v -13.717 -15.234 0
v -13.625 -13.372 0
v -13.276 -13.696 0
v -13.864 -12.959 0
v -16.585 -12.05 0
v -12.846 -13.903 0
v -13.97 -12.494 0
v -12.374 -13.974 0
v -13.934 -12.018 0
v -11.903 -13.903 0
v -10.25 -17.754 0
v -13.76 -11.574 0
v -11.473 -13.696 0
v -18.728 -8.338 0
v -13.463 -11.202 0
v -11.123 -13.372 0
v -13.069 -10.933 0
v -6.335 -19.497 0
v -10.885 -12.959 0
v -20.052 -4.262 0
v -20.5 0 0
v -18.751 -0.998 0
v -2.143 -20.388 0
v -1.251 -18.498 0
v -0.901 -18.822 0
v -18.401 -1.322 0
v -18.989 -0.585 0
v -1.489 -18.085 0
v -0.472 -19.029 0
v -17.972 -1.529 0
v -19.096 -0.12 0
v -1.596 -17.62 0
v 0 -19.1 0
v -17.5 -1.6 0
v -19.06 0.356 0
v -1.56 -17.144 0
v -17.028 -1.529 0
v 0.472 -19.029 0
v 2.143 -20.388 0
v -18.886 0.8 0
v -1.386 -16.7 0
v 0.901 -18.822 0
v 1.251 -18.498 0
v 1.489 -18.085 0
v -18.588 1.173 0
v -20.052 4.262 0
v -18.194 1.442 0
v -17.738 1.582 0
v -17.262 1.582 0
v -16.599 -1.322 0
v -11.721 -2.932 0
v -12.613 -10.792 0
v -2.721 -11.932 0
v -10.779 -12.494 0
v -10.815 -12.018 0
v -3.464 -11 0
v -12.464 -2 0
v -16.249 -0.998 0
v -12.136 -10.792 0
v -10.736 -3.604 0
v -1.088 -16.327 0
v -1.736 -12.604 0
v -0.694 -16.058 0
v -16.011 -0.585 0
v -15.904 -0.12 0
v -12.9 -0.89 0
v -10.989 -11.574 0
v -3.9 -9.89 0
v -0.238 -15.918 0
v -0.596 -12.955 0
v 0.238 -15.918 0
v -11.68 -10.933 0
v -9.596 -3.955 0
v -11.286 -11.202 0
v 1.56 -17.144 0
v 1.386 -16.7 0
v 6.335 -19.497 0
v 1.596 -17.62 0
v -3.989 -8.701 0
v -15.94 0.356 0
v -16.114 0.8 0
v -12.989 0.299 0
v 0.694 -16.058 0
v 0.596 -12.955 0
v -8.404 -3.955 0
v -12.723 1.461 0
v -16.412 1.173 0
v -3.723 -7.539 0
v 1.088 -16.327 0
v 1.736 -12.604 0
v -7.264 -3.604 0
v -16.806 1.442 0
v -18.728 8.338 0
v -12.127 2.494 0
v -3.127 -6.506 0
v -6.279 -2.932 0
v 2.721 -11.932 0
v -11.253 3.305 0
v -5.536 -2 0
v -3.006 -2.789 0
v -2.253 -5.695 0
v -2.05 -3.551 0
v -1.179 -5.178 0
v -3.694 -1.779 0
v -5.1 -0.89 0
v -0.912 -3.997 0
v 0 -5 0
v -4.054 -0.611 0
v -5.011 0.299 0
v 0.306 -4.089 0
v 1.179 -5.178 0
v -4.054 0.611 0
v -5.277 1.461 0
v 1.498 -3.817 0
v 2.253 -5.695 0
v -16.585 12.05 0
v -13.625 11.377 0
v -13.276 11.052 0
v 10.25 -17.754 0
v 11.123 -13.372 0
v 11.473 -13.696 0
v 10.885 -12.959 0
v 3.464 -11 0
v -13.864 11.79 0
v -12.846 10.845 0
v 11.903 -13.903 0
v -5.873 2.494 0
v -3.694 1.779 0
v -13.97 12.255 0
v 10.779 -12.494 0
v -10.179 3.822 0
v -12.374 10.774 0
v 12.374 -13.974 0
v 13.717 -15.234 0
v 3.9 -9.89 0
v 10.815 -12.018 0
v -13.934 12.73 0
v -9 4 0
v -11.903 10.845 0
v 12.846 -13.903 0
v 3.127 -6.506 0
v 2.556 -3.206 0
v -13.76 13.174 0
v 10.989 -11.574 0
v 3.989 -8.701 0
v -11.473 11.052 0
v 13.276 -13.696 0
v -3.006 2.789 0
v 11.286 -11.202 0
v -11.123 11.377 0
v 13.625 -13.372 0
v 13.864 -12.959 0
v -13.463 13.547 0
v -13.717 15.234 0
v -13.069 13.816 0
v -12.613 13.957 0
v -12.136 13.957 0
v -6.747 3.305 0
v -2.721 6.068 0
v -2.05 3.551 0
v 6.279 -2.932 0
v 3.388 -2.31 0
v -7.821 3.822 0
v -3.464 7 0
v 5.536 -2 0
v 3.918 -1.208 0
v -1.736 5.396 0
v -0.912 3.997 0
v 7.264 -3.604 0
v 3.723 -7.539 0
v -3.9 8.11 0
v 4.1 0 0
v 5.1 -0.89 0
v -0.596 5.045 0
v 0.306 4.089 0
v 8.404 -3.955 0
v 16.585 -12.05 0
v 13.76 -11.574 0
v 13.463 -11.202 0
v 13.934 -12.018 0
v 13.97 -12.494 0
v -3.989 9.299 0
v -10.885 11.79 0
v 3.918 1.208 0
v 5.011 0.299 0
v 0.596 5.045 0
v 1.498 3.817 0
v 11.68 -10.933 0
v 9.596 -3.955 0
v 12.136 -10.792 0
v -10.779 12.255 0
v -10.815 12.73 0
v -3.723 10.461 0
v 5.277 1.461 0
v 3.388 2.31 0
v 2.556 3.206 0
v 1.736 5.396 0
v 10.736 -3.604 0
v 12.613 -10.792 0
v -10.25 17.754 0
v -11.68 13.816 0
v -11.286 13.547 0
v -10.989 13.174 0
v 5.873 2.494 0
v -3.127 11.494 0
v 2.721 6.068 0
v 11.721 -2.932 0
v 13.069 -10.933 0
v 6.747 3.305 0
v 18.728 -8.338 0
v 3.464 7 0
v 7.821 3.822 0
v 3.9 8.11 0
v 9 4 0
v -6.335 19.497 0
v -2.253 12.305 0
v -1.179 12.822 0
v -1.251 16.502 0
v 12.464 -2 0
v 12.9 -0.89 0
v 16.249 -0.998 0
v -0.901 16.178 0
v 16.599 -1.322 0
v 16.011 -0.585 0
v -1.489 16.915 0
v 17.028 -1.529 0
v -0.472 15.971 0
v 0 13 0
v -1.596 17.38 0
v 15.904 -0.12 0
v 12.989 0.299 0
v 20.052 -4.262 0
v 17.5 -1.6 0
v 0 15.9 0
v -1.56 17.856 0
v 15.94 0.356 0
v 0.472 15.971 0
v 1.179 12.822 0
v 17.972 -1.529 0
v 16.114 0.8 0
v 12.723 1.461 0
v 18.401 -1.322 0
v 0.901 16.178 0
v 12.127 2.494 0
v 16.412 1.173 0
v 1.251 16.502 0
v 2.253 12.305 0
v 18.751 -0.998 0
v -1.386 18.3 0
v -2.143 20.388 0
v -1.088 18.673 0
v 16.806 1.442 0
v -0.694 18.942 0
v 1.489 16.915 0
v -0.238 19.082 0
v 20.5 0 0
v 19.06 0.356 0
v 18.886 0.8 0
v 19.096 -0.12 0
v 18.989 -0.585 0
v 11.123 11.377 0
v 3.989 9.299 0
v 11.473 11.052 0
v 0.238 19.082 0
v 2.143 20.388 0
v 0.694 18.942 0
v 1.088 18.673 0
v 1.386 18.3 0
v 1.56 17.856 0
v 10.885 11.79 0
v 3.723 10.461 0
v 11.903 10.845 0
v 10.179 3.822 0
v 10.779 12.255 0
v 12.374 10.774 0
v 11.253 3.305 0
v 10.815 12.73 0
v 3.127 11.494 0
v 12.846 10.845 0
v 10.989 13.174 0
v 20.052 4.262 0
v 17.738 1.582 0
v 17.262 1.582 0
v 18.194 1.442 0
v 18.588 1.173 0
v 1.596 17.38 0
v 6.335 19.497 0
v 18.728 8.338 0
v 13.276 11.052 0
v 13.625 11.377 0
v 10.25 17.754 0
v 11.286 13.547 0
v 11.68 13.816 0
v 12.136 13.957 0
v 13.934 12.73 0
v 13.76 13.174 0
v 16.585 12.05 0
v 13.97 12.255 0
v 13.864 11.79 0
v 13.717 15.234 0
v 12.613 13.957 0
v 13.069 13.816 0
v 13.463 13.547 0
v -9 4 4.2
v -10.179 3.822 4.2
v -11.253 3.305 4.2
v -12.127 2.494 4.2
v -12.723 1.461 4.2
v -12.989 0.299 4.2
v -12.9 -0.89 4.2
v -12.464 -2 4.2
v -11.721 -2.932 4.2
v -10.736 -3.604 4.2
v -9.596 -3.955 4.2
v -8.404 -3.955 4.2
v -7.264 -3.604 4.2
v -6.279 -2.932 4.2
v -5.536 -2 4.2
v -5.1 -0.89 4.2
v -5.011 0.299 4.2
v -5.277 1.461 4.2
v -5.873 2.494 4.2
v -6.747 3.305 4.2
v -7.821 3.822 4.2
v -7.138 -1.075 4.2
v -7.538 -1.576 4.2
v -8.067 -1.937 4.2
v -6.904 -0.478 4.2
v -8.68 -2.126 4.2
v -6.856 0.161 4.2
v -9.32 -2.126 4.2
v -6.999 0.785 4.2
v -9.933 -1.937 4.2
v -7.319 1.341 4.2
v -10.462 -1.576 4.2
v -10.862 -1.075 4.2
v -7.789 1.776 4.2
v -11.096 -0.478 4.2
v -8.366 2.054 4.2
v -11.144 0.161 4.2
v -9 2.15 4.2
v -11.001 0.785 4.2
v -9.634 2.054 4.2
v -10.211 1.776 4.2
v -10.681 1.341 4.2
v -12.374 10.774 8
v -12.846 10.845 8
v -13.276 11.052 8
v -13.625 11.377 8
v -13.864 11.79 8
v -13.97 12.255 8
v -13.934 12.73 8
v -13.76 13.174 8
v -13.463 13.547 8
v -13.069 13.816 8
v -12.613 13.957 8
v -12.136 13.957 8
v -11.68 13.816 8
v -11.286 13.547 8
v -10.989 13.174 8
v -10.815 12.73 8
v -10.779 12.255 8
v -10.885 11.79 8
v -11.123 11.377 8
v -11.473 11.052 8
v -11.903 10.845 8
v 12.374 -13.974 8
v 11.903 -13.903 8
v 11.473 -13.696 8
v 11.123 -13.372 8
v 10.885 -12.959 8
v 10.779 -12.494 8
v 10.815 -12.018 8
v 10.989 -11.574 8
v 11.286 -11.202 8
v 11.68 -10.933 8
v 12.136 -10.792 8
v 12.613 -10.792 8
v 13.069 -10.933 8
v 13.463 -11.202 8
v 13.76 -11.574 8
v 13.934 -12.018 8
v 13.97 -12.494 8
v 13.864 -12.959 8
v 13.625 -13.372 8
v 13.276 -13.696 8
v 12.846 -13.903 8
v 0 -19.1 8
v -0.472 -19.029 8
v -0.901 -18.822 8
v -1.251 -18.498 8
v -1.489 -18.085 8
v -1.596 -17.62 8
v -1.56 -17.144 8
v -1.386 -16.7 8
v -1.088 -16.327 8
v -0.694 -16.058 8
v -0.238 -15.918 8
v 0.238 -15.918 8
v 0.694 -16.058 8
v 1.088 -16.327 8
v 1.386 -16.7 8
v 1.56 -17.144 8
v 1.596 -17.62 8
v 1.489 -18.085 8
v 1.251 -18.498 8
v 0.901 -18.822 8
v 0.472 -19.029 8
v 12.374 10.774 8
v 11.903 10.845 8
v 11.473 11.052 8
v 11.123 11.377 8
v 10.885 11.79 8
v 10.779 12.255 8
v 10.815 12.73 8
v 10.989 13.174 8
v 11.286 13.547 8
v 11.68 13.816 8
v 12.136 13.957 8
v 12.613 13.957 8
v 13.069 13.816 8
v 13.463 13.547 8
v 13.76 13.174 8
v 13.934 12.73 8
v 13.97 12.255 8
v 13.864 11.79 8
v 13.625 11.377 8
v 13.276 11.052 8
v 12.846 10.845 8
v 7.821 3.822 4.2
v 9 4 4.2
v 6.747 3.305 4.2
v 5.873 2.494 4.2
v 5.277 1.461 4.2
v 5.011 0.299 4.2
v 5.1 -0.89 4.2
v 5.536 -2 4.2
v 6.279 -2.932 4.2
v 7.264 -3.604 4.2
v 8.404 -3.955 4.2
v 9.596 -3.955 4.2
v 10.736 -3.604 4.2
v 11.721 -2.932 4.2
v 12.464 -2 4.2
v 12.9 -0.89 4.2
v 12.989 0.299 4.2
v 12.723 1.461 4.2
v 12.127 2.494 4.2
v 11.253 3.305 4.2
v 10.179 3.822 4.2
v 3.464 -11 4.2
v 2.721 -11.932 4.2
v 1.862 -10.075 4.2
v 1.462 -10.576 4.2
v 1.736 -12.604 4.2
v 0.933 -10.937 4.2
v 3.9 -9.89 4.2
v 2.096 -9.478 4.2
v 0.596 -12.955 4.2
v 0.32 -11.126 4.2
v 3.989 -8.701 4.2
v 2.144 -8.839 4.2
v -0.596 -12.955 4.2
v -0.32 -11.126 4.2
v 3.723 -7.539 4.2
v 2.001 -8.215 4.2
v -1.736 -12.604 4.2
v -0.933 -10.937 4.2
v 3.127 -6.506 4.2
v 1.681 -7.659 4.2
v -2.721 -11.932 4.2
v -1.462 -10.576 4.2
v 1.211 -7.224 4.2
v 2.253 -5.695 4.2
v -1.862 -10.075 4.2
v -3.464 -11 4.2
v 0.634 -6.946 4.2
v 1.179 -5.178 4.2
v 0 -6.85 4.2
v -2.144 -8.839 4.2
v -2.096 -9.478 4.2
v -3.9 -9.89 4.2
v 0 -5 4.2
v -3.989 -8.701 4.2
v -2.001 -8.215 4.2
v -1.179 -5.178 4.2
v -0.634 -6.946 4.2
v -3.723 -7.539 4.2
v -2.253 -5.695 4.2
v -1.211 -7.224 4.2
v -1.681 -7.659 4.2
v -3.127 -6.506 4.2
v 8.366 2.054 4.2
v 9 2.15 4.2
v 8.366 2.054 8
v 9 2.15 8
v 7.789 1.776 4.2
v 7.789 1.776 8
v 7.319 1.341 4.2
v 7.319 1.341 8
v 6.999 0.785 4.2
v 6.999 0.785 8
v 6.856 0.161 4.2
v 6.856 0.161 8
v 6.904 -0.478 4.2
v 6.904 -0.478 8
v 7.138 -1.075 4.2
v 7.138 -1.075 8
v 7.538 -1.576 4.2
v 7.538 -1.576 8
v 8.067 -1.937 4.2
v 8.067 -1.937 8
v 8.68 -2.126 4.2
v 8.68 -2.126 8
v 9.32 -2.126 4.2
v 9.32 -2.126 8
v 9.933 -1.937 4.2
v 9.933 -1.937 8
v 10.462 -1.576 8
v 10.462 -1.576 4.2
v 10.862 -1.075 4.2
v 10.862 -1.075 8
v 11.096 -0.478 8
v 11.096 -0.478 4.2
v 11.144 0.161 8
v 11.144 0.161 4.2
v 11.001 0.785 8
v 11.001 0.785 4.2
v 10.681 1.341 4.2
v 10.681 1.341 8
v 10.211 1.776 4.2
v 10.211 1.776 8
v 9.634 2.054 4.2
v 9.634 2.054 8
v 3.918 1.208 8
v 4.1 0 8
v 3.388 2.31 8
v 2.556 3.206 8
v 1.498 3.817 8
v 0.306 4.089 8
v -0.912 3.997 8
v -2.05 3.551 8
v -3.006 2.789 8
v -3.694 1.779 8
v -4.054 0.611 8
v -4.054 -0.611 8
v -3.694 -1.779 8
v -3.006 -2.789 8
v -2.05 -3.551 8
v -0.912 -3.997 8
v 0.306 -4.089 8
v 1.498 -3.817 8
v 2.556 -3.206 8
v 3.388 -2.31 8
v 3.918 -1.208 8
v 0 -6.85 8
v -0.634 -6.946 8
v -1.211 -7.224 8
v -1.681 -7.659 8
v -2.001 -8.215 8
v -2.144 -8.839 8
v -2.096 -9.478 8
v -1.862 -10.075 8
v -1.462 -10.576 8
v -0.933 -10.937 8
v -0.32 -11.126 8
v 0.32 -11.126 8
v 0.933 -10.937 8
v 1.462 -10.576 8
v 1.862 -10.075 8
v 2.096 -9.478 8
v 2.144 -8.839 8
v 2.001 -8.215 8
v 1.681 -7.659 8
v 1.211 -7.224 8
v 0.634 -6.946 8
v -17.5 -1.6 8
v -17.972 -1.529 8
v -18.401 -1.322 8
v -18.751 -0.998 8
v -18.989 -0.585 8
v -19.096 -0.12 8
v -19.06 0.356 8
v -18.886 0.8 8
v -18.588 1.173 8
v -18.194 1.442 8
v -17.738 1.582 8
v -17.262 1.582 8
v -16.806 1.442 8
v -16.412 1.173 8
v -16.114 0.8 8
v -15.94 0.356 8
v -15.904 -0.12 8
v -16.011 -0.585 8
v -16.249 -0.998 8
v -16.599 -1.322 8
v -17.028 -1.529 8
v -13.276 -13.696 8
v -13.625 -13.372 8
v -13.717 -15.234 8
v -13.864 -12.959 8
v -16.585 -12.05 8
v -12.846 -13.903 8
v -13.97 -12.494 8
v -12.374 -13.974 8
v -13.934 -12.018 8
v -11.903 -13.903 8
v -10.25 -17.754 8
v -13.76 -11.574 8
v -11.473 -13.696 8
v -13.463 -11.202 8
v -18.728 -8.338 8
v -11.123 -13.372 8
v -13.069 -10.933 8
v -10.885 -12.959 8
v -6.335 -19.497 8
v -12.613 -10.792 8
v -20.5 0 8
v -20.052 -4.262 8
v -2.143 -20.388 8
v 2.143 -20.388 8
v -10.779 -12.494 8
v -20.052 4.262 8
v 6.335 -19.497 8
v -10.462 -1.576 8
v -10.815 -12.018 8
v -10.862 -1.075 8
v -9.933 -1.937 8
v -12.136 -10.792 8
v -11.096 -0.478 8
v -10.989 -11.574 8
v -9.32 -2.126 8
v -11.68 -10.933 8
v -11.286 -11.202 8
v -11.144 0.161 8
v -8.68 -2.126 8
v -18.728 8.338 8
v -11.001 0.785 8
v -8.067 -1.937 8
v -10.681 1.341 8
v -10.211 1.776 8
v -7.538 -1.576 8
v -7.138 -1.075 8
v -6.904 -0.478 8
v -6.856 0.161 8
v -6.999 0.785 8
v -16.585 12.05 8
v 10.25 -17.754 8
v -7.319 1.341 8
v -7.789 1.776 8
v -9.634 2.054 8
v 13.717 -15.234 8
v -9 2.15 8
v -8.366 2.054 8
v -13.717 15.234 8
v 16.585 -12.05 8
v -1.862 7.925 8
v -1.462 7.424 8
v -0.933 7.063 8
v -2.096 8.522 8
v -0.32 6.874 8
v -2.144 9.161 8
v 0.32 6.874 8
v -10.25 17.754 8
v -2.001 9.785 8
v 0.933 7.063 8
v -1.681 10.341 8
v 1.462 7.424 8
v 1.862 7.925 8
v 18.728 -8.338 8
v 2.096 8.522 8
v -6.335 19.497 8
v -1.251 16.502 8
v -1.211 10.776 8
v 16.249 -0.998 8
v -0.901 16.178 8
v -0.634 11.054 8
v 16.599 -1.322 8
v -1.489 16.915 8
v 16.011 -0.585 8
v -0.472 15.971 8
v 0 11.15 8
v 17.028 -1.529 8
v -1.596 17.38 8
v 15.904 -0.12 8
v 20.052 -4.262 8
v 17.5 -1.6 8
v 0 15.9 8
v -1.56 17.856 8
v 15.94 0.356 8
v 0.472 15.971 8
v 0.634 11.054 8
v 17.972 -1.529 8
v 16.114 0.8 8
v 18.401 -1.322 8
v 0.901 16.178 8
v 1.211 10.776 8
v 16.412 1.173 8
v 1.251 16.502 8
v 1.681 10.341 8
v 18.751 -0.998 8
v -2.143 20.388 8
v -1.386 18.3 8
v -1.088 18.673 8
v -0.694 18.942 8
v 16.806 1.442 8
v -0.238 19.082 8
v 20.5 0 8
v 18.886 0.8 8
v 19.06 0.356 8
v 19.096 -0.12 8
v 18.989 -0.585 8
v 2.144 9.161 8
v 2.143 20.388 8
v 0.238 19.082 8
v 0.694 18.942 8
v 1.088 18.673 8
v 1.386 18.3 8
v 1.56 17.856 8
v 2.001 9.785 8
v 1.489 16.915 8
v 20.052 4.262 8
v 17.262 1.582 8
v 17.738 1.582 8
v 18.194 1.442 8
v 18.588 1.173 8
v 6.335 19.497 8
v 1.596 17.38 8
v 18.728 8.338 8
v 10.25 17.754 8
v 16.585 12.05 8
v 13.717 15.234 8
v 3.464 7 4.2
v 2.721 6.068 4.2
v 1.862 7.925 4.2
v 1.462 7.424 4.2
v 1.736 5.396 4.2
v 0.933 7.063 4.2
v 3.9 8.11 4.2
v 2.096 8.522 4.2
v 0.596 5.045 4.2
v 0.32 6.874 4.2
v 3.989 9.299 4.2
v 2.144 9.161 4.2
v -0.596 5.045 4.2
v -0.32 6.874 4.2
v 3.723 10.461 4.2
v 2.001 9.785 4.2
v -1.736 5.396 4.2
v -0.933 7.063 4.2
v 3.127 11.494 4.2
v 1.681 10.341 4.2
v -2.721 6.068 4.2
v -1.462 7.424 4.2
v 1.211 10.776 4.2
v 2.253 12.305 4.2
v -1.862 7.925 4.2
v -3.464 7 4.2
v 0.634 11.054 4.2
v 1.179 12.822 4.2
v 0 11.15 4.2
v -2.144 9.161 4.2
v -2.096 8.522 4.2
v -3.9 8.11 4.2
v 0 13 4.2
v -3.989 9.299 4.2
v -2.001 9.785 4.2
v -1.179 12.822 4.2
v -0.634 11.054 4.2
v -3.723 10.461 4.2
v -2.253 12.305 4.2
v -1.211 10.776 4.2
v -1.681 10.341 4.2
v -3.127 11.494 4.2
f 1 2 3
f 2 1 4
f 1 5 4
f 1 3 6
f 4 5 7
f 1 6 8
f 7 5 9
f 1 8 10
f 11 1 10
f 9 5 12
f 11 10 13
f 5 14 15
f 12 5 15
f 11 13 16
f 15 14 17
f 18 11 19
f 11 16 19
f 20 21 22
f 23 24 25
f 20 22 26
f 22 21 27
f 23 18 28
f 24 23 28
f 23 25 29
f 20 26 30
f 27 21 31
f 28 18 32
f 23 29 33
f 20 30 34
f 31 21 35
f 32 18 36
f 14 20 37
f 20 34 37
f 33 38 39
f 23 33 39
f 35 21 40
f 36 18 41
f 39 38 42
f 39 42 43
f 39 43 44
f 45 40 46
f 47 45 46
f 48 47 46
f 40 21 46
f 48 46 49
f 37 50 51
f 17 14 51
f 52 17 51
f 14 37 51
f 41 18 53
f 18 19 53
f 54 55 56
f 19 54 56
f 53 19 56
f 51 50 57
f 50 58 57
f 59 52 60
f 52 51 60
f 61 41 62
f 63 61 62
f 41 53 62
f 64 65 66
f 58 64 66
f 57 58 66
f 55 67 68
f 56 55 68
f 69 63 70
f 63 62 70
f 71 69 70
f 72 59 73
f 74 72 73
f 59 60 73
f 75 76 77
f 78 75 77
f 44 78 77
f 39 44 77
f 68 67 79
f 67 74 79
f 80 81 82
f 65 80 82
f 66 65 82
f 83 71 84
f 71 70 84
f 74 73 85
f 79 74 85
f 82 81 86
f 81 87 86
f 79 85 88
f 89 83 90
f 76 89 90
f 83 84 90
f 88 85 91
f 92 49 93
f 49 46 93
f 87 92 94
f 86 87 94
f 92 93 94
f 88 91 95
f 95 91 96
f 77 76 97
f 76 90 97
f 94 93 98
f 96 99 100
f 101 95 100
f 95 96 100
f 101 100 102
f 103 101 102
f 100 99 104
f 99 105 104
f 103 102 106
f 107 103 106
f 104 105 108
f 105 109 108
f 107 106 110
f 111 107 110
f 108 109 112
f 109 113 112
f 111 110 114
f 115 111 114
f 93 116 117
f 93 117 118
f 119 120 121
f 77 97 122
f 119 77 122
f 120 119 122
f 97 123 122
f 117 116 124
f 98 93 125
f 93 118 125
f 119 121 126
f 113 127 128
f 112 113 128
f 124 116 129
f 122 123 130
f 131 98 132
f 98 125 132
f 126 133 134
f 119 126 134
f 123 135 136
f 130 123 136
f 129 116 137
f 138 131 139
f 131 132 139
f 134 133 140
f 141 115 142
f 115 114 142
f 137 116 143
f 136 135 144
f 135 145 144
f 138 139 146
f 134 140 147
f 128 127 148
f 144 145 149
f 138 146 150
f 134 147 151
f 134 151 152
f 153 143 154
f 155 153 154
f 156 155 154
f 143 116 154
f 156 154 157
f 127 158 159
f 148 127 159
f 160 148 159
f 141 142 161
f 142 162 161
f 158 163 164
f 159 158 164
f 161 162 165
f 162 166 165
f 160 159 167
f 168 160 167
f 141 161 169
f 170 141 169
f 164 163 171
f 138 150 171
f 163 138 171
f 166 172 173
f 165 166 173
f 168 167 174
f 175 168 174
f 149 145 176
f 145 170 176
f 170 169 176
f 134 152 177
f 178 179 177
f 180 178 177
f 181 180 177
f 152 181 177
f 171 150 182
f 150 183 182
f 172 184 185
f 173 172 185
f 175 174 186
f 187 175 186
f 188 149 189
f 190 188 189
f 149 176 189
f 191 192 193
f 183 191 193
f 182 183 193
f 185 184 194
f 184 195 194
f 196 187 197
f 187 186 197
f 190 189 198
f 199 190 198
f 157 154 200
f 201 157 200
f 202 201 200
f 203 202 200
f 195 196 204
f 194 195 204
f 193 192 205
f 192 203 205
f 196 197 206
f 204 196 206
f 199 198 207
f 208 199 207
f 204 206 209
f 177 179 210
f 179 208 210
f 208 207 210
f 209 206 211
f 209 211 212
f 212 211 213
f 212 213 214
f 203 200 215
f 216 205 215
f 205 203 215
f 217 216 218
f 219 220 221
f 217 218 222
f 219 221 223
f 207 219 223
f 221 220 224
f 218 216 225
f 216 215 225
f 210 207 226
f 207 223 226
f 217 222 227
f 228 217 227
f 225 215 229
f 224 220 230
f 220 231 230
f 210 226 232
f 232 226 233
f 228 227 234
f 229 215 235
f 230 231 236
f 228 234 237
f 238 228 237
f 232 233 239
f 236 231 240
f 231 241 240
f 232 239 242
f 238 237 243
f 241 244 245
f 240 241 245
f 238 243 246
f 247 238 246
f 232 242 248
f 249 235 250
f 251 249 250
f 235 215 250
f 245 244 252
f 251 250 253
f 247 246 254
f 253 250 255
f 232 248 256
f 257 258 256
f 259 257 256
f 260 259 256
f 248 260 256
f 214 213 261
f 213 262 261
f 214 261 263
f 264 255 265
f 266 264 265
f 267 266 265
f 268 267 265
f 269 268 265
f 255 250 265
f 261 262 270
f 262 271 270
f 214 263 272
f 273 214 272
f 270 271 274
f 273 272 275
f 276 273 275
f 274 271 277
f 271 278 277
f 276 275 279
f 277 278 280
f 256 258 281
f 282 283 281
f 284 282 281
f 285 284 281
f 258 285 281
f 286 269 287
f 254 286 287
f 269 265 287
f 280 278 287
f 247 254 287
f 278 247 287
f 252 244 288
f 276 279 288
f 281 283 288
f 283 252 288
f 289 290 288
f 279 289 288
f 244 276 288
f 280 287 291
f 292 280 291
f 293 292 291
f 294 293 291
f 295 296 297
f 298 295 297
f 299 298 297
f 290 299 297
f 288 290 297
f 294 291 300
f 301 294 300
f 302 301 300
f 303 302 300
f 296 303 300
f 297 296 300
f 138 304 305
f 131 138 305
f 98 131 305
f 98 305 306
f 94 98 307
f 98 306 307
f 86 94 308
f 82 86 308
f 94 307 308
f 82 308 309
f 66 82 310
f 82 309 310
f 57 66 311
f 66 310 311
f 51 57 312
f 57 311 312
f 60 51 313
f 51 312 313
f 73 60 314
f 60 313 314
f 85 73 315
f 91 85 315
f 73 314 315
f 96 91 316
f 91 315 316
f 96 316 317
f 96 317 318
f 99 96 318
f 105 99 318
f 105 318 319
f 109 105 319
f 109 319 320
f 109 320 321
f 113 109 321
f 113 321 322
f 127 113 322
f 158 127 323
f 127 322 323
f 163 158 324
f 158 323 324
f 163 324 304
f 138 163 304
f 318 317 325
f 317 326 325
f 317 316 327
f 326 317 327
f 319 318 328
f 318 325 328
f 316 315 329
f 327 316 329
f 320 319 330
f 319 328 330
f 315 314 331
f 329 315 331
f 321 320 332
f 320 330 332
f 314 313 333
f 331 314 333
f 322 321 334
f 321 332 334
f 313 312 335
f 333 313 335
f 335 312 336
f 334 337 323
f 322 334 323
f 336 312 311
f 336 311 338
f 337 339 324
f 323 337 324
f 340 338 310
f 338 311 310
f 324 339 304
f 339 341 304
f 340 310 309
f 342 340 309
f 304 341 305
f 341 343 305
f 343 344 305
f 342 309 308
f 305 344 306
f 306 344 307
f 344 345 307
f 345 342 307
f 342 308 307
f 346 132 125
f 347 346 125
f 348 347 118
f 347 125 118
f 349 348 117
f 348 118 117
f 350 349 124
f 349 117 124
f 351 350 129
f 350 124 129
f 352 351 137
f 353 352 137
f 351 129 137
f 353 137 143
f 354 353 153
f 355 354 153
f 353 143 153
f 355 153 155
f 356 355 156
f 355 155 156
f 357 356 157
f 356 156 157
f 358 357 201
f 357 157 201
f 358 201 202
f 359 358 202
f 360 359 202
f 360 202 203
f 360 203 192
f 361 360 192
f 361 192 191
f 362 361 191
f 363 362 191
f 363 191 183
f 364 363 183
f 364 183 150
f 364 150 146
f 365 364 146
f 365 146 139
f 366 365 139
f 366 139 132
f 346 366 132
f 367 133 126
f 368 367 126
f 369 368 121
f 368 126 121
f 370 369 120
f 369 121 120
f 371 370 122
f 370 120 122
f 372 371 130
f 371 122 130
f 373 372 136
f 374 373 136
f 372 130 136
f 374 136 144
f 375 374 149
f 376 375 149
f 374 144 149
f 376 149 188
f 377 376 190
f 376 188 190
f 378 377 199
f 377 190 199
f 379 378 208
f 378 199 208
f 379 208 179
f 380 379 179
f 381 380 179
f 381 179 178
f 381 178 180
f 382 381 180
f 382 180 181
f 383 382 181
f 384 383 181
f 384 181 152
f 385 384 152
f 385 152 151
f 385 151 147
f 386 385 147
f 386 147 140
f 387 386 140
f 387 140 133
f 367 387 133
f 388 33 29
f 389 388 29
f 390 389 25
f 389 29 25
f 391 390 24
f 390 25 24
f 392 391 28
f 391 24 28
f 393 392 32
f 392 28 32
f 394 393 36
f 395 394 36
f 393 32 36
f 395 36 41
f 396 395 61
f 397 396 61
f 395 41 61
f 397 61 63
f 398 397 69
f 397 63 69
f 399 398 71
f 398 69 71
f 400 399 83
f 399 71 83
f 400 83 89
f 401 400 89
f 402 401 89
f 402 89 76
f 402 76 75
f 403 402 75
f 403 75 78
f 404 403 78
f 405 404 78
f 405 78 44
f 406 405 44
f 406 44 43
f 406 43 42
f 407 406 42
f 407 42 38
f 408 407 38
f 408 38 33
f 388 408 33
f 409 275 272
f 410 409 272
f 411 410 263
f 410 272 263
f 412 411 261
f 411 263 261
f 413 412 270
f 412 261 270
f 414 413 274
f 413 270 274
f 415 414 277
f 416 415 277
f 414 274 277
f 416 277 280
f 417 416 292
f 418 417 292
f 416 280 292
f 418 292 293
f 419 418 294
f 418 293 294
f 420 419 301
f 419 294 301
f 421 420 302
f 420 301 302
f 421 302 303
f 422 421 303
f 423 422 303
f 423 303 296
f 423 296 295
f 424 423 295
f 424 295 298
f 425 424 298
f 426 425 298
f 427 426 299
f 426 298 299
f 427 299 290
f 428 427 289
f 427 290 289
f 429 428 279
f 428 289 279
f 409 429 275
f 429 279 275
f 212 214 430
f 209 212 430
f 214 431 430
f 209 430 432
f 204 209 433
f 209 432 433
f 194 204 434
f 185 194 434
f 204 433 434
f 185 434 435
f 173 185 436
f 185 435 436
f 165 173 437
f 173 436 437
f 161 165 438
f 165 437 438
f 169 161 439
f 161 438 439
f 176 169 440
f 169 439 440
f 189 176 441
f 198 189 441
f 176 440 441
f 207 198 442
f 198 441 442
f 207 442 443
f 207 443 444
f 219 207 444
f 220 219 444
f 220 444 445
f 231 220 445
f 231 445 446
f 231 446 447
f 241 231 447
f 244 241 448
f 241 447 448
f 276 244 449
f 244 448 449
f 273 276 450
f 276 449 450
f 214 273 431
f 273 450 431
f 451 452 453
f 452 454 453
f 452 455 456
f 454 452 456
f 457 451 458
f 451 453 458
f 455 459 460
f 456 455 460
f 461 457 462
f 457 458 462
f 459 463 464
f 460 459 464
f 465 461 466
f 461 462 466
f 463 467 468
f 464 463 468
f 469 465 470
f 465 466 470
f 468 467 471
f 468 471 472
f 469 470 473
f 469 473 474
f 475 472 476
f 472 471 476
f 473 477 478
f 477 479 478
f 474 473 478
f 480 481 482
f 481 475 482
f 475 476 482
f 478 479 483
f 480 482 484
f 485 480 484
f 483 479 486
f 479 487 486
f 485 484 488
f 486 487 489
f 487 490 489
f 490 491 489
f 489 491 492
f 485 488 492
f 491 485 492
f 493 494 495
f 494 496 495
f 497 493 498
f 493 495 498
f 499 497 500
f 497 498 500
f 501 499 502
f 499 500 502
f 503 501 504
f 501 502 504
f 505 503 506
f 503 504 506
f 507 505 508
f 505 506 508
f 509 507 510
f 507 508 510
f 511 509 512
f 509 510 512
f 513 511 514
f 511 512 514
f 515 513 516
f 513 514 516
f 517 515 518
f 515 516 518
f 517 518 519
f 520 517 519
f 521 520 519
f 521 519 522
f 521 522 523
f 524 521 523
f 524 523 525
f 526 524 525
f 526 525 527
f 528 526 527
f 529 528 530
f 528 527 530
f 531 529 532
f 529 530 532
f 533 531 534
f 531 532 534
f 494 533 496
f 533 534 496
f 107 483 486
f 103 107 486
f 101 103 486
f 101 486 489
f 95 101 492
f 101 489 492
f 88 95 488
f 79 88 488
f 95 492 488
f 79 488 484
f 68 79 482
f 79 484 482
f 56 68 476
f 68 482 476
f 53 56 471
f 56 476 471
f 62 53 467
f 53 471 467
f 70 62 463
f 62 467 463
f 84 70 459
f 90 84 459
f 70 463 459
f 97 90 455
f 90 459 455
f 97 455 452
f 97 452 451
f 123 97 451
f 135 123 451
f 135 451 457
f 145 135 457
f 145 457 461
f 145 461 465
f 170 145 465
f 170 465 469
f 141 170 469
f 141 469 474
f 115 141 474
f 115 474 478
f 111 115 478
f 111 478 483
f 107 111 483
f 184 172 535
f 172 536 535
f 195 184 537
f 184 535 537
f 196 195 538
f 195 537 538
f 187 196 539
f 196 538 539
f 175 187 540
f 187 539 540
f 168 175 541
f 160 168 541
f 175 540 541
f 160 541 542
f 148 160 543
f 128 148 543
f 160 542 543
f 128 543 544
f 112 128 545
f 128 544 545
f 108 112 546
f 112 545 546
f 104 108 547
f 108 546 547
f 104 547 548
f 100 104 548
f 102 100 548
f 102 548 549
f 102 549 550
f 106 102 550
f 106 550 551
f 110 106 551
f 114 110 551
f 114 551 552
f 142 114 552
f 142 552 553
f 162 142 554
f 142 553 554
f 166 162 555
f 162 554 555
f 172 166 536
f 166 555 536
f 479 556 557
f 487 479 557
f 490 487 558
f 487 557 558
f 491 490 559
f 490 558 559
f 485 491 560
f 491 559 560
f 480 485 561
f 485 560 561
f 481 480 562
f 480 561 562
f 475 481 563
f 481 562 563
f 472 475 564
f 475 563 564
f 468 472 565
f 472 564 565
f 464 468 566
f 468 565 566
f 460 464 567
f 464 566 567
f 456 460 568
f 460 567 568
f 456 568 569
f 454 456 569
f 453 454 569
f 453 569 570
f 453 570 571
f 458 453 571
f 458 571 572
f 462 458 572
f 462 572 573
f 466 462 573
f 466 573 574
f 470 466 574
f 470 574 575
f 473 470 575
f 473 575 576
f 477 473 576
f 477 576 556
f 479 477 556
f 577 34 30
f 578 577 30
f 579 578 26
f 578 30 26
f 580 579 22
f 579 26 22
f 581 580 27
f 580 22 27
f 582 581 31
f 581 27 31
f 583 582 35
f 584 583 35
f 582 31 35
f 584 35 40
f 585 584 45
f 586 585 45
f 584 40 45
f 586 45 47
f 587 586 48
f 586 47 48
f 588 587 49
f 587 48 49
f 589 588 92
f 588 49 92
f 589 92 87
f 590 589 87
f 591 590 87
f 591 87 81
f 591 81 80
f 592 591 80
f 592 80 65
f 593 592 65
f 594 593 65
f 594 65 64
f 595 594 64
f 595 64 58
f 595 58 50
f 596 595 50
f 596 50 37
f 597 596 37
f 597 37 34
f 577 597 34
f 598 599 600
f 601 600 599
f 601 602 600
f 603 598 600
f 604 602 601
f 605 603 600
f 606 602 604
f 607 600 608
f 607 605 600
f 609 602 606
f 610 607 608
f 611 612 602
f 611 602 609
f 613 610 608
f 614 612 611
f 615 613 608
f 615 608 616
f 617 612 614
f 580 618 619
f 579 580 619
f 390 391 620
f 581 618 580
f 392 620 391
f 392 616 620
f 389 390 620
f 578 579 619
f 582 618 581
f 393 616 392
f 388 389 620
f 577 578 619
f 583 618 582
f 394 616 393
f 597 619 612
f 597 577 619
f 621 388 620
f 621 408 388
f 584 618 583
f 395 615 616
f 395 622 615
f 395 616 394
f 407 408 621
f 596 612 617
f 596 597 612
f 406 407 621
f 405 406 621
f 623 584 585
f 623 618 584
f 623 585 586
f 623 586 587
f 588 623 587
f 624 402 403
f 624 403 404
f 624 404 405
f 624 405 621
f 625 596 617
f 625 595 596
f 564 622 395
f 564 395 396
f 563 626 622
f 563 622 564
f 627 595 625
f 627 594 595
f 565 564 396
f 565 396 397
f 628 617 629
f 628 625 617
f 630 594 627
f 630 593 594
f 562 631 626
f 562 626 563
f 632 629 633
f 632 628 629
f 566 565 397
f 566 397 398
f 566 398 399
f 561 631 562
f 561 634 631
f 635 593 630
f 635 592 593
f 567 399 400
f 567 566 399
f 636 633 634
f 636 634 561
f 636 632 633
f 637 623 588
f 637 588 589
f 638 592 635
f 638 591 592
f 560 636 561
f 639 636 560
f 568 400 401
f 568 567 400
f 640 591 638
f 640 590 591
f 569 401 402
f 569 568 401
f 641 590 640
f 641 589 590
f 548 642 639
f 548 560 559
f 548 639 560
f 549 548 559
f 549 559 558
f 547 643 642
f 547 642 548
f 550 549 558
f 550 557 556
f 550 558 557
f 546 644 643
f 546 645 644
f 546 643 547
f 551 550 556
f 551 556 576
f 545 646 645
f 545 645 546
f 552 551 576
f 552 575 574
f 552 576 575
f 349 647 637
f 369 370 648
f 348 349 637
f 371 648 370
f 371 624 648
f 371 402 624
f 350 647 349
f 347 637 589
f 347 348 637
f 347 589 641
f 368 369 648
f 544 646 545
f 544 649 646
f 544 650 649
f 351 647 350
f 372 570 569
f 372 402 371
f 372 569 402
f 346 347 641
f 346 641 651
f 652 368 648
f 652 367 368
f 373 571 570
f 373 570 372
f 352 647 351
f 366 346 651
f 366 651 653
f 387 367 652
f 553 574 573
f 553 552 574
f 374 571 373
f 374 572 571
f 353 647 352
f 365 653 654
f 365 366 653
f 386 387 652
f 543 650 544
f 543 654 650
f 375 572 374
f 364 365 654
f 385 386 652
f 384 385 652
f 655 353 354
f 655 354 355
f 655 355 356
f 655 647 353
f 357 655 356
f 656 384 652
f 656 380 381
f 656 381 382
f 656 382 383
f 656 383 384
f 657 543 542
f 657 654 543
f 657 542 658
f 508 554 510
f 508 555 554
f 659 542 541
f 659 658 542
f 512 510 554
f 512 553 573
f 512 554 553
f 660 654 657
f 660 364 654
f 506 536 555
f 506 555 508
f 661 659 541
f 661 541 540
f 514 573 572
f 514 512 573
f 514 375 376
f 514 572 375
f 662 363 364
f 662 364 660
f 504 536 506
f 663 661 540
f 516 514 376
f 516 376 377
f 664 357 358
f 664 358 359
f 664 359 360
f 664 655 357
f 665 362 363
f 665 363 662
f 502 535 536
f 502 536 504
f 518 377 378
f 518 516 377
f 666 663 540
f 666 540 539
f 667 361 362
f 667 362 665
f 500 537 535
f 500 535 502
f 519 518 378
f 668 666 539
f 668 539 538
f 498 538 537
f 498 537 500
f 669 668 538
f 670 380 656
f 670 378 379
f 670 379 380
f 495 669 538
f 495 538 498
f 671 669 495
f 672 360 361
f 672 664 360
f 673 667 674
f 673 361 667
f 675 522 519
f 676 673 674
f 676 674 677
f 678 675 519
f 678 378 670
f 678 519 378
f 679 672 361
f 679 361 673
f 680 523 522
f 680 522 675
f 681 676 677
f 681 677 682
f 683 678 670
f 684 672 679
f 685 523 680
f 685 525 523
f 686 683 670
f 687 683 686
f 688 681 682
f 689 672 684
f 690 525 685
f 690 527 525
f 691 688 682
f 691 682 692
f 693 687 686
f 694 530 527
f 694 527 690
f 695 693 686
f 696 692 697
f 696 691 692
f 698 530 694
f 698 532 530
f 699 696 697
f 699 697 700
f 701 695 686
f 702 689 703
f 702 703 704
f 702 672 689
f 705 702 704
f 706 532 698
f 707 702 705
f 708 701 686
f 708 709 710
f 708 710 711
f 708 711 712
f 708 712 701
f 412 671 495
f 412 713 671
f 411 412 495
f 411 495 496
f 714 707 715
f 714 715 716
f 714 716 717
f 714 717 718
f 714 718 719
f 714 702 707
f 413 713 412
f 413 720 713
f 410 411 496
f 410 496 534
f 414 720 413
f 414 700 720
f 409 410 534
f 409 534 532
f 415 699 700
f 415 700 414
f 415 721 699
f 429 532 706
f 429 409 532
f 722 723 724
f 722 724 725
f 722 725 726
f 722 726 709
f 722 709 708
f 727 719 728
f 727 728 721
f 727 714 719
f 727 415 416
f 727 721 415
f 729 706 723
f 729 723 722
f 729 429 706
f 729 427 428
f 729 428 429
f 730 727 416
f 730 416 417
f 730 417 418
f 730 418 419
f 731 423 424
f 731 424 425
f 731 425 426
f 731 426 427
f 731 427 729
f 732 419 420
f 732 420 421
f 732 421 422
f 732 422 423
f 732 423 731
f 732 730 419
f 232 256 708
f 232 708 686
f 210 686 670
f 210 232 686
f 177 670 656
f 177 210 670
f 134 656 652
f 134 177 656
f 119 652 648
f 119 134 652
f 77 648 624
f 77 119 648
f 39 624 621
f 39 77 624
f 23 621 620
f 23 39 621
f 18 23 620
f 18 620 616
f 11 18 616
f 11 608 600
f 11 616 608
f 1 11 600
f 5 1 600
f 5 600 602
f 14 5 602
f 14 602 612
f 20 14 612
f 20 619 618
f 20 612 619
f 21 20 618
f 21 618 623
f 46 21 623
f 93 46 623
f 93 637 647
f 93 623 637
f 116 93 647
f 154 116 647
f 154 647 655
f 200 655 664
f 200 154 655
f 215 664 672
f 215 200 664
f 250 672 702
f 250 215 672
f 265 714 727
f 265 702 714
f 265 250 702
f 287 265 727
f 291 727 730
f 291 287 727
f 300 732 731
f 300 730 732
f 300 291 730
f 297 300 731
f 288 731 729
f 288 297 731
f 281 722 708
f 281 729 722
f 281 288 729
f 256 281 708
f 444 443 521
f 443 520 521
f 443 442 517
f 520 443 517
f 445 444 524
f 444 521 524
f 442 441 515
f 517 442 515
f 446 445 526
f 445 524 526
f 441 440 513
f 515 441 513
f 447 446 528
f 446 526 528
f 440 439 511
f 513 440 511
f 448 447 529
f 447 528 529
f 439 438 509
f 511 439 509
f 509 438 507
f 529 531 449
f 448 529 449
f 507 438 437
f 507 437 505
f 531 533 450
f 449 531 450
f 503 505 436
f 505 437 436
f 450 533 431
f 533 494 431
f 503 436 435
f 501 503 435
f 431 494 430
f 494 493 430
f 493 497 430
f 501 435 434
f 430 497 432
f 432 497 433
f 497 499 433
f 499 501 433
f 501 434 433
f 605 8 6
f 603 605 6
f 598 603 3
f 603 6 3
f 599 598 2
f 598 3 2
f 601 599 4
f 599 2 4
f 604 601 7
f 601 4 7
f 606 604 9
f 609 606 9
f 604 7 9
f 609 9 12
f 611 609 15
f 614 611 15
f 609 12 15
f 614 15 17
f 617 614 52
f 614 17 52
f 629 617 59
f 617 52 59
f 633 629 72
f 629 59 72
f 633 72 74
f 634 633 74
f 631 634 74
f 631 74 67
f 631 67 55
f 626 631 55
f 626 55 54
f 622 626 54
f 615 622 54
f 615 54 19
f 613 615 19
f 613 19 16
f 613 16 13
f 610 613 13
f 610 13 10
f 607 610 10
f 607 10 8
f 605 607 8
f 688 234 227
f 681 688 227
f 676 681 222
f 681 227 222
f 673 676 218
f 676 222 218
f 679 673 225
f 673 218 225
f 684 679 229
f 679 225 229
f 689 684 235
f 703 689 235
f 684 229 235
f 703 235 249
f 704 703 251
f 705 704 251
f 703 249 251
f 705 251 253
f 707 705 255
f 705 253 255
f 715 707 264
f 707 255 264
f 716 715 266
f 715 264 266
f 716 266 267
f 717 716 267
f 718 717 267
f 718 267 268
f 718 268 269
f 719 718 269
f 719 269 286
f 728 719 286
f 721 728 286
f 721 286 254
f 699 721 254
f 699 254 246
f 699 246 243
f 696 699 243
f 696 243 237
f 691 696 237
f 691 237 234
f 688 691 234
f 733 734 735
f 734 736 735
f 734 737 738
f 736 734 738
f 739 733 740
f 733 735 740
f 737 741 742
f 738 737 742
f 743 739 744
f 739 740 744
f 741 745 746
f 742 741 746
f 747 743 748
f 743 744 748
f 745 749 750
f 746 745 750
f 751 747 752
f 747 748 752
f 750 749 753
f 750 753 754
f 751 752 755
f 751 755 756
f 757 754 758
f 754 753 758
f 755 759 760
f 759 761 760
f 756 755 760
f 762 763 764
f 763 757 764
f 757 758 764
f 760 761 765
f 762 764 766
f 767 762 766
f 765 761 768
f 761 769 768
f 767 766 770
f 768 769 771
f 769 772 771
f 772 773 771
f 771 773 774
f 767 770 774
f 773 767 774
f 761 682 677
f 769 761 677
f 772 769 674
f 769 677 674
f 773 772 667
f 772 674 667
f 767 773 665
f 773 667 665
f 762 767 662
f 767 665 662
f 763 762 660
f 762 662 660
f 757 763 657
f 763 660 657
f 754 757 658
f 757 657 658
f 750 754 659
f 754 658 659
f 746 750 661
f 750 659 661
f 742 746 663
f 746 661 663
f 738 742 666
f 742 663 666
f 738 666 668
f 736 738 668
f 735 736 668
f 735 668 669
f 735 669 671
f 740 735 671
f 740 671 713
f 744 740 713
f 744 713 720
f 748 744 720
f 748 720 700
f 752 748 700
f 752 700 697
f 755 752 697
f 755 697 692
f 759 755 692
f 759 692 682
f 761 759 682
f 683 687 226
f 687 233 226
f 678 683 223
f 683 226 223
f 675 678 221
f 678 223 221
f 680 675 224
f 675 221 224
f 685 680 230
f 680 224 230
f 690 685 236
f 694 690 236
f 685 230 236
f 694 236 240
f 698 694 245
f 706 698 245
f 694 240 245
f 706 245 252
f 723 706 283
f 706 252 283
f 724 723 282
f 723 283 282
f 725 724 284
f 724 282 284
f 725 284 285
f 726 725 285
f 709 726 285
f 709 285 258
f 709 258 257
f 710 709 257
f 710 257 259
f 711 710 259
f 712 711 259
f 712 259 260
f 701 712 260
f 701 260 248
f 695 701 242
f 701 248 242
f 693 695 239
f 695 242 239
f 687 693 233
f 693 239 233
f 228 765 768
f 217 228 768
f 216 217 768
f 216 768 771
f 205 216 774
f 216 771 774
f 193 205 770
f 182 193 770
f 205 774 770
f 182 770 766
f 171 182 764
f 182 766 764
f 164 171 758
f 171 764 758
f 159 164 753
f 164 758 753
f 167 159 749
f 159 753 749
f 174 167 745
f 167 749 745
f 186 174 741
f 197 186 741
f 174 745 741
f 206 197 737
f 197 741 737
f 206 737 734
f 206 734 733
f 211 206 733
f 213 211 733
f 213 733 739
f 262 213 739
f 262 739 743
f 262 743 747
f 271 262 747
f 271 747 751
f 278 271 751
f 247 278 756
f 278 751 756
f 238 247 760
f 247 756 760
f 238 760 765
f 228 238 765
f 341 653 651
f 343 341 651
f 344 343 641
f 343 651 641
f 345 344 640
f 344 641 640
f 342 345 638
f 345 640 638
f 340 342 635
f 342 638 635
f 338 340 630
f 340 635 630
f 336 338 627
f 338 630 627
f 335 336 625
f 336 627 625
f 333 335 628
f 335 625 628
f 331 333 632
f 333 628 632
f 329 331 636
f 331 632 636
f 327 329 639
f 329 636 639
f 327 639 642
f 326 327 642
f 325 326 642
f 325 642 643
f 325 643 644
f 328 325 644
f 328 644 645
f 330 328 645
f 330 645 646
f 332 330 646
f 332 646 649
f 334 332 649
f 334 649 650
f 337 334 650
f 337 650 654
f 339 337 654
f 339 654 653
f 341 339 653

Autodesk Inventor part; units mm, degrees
ref_plane "YZ Plane" through (0, 0, 0) normal (1, 0, 0) x (0, 1, 0)
ref_plane "XZ Plane" through (0, 0, 0) normal (0, 1, 0) x (-1, 0, 0)
ref_plane "XY Plane" through (0, 0, 0) normal (0, 0, 1) x (1, 0, 0)
sketch "スケッチ1" plane through (0, 0, 0) normal (0, 0, 1) x (1, 0, 0)
  circle A0 centre (0, 0) radius 20.5
  dimension "d0" = 41
extrude "押し出し1" add sketch "スケッチ1" along normal blind 8
sketch "スケッチ2" plane through (0, 0, 8) normal (0, 0, 1) x (1, 0, 0)
  circle A0 centre (0, 0) radius 17.5
  point P0 (0, 17.5)
  point P1 (-12.3744, 12.3744)
  point P2 (-17.5, 0)
  point P3 (-12.3744, -12.3744)
  point P4 (0, -17.5)
  point P5 (12.3744, -12.3744)
  point P6 (17.5, 0)
  point P7 (12.3744, 12.3744)
  dimension "d3" = 35
  dimension "d6" = 360
hole "穴1" at (0, 17.5, 8) at (-12.3744, 12.3744, 8) at (-17.5, 0, 8) at (-12.3744, -12.3744, 8) at (0, -17.5, 8) at (12.3744, -12.3744, 8) at (17.5, 0, 8) at (12.3744, 12.3744, 8) direction (0, 0, -1) diameter 3.2 end through all clearance for "Socket Head Cap Screw" size "M3" standard "Ansi Metric M Profile"
sketch "スケッチ3" plane through (0, 0, 0) normal (0, 0, -1) x (-1, 0, 0)
  circle A0 centre (0, 0) radius 9
  point P0 (0, 9)
  point P1 (-9, 0)
  point P2 (0, -9)
  point P3 (9, 0)
  dimension "d15" = 18
  dimension "d18" = 360
hole "穴2" at (0, 9, 0) at (9, 0, 0) at (0, -9, 0) at (-9, 0, 0) direction (0, 0, 1) diameter 4.3 end through all counterbore diameter 8 counterbore depth 4.2 clearance for "Socket Head Cap Screw" size "M4" standard "Ansi Metric M Profile"
sketch "スケッチ4" plane through (0, 0, 8) normal (0, 0, 1) x (1, 0, 0)
  circle A0 centre (0, 0) radius 4.1
  dimension "d27" = 8.2
extrude "押し出し2" cut sketch "スケッチ4" against normal through all
properties part number "scara-base10" material "ABS プラスチック"
